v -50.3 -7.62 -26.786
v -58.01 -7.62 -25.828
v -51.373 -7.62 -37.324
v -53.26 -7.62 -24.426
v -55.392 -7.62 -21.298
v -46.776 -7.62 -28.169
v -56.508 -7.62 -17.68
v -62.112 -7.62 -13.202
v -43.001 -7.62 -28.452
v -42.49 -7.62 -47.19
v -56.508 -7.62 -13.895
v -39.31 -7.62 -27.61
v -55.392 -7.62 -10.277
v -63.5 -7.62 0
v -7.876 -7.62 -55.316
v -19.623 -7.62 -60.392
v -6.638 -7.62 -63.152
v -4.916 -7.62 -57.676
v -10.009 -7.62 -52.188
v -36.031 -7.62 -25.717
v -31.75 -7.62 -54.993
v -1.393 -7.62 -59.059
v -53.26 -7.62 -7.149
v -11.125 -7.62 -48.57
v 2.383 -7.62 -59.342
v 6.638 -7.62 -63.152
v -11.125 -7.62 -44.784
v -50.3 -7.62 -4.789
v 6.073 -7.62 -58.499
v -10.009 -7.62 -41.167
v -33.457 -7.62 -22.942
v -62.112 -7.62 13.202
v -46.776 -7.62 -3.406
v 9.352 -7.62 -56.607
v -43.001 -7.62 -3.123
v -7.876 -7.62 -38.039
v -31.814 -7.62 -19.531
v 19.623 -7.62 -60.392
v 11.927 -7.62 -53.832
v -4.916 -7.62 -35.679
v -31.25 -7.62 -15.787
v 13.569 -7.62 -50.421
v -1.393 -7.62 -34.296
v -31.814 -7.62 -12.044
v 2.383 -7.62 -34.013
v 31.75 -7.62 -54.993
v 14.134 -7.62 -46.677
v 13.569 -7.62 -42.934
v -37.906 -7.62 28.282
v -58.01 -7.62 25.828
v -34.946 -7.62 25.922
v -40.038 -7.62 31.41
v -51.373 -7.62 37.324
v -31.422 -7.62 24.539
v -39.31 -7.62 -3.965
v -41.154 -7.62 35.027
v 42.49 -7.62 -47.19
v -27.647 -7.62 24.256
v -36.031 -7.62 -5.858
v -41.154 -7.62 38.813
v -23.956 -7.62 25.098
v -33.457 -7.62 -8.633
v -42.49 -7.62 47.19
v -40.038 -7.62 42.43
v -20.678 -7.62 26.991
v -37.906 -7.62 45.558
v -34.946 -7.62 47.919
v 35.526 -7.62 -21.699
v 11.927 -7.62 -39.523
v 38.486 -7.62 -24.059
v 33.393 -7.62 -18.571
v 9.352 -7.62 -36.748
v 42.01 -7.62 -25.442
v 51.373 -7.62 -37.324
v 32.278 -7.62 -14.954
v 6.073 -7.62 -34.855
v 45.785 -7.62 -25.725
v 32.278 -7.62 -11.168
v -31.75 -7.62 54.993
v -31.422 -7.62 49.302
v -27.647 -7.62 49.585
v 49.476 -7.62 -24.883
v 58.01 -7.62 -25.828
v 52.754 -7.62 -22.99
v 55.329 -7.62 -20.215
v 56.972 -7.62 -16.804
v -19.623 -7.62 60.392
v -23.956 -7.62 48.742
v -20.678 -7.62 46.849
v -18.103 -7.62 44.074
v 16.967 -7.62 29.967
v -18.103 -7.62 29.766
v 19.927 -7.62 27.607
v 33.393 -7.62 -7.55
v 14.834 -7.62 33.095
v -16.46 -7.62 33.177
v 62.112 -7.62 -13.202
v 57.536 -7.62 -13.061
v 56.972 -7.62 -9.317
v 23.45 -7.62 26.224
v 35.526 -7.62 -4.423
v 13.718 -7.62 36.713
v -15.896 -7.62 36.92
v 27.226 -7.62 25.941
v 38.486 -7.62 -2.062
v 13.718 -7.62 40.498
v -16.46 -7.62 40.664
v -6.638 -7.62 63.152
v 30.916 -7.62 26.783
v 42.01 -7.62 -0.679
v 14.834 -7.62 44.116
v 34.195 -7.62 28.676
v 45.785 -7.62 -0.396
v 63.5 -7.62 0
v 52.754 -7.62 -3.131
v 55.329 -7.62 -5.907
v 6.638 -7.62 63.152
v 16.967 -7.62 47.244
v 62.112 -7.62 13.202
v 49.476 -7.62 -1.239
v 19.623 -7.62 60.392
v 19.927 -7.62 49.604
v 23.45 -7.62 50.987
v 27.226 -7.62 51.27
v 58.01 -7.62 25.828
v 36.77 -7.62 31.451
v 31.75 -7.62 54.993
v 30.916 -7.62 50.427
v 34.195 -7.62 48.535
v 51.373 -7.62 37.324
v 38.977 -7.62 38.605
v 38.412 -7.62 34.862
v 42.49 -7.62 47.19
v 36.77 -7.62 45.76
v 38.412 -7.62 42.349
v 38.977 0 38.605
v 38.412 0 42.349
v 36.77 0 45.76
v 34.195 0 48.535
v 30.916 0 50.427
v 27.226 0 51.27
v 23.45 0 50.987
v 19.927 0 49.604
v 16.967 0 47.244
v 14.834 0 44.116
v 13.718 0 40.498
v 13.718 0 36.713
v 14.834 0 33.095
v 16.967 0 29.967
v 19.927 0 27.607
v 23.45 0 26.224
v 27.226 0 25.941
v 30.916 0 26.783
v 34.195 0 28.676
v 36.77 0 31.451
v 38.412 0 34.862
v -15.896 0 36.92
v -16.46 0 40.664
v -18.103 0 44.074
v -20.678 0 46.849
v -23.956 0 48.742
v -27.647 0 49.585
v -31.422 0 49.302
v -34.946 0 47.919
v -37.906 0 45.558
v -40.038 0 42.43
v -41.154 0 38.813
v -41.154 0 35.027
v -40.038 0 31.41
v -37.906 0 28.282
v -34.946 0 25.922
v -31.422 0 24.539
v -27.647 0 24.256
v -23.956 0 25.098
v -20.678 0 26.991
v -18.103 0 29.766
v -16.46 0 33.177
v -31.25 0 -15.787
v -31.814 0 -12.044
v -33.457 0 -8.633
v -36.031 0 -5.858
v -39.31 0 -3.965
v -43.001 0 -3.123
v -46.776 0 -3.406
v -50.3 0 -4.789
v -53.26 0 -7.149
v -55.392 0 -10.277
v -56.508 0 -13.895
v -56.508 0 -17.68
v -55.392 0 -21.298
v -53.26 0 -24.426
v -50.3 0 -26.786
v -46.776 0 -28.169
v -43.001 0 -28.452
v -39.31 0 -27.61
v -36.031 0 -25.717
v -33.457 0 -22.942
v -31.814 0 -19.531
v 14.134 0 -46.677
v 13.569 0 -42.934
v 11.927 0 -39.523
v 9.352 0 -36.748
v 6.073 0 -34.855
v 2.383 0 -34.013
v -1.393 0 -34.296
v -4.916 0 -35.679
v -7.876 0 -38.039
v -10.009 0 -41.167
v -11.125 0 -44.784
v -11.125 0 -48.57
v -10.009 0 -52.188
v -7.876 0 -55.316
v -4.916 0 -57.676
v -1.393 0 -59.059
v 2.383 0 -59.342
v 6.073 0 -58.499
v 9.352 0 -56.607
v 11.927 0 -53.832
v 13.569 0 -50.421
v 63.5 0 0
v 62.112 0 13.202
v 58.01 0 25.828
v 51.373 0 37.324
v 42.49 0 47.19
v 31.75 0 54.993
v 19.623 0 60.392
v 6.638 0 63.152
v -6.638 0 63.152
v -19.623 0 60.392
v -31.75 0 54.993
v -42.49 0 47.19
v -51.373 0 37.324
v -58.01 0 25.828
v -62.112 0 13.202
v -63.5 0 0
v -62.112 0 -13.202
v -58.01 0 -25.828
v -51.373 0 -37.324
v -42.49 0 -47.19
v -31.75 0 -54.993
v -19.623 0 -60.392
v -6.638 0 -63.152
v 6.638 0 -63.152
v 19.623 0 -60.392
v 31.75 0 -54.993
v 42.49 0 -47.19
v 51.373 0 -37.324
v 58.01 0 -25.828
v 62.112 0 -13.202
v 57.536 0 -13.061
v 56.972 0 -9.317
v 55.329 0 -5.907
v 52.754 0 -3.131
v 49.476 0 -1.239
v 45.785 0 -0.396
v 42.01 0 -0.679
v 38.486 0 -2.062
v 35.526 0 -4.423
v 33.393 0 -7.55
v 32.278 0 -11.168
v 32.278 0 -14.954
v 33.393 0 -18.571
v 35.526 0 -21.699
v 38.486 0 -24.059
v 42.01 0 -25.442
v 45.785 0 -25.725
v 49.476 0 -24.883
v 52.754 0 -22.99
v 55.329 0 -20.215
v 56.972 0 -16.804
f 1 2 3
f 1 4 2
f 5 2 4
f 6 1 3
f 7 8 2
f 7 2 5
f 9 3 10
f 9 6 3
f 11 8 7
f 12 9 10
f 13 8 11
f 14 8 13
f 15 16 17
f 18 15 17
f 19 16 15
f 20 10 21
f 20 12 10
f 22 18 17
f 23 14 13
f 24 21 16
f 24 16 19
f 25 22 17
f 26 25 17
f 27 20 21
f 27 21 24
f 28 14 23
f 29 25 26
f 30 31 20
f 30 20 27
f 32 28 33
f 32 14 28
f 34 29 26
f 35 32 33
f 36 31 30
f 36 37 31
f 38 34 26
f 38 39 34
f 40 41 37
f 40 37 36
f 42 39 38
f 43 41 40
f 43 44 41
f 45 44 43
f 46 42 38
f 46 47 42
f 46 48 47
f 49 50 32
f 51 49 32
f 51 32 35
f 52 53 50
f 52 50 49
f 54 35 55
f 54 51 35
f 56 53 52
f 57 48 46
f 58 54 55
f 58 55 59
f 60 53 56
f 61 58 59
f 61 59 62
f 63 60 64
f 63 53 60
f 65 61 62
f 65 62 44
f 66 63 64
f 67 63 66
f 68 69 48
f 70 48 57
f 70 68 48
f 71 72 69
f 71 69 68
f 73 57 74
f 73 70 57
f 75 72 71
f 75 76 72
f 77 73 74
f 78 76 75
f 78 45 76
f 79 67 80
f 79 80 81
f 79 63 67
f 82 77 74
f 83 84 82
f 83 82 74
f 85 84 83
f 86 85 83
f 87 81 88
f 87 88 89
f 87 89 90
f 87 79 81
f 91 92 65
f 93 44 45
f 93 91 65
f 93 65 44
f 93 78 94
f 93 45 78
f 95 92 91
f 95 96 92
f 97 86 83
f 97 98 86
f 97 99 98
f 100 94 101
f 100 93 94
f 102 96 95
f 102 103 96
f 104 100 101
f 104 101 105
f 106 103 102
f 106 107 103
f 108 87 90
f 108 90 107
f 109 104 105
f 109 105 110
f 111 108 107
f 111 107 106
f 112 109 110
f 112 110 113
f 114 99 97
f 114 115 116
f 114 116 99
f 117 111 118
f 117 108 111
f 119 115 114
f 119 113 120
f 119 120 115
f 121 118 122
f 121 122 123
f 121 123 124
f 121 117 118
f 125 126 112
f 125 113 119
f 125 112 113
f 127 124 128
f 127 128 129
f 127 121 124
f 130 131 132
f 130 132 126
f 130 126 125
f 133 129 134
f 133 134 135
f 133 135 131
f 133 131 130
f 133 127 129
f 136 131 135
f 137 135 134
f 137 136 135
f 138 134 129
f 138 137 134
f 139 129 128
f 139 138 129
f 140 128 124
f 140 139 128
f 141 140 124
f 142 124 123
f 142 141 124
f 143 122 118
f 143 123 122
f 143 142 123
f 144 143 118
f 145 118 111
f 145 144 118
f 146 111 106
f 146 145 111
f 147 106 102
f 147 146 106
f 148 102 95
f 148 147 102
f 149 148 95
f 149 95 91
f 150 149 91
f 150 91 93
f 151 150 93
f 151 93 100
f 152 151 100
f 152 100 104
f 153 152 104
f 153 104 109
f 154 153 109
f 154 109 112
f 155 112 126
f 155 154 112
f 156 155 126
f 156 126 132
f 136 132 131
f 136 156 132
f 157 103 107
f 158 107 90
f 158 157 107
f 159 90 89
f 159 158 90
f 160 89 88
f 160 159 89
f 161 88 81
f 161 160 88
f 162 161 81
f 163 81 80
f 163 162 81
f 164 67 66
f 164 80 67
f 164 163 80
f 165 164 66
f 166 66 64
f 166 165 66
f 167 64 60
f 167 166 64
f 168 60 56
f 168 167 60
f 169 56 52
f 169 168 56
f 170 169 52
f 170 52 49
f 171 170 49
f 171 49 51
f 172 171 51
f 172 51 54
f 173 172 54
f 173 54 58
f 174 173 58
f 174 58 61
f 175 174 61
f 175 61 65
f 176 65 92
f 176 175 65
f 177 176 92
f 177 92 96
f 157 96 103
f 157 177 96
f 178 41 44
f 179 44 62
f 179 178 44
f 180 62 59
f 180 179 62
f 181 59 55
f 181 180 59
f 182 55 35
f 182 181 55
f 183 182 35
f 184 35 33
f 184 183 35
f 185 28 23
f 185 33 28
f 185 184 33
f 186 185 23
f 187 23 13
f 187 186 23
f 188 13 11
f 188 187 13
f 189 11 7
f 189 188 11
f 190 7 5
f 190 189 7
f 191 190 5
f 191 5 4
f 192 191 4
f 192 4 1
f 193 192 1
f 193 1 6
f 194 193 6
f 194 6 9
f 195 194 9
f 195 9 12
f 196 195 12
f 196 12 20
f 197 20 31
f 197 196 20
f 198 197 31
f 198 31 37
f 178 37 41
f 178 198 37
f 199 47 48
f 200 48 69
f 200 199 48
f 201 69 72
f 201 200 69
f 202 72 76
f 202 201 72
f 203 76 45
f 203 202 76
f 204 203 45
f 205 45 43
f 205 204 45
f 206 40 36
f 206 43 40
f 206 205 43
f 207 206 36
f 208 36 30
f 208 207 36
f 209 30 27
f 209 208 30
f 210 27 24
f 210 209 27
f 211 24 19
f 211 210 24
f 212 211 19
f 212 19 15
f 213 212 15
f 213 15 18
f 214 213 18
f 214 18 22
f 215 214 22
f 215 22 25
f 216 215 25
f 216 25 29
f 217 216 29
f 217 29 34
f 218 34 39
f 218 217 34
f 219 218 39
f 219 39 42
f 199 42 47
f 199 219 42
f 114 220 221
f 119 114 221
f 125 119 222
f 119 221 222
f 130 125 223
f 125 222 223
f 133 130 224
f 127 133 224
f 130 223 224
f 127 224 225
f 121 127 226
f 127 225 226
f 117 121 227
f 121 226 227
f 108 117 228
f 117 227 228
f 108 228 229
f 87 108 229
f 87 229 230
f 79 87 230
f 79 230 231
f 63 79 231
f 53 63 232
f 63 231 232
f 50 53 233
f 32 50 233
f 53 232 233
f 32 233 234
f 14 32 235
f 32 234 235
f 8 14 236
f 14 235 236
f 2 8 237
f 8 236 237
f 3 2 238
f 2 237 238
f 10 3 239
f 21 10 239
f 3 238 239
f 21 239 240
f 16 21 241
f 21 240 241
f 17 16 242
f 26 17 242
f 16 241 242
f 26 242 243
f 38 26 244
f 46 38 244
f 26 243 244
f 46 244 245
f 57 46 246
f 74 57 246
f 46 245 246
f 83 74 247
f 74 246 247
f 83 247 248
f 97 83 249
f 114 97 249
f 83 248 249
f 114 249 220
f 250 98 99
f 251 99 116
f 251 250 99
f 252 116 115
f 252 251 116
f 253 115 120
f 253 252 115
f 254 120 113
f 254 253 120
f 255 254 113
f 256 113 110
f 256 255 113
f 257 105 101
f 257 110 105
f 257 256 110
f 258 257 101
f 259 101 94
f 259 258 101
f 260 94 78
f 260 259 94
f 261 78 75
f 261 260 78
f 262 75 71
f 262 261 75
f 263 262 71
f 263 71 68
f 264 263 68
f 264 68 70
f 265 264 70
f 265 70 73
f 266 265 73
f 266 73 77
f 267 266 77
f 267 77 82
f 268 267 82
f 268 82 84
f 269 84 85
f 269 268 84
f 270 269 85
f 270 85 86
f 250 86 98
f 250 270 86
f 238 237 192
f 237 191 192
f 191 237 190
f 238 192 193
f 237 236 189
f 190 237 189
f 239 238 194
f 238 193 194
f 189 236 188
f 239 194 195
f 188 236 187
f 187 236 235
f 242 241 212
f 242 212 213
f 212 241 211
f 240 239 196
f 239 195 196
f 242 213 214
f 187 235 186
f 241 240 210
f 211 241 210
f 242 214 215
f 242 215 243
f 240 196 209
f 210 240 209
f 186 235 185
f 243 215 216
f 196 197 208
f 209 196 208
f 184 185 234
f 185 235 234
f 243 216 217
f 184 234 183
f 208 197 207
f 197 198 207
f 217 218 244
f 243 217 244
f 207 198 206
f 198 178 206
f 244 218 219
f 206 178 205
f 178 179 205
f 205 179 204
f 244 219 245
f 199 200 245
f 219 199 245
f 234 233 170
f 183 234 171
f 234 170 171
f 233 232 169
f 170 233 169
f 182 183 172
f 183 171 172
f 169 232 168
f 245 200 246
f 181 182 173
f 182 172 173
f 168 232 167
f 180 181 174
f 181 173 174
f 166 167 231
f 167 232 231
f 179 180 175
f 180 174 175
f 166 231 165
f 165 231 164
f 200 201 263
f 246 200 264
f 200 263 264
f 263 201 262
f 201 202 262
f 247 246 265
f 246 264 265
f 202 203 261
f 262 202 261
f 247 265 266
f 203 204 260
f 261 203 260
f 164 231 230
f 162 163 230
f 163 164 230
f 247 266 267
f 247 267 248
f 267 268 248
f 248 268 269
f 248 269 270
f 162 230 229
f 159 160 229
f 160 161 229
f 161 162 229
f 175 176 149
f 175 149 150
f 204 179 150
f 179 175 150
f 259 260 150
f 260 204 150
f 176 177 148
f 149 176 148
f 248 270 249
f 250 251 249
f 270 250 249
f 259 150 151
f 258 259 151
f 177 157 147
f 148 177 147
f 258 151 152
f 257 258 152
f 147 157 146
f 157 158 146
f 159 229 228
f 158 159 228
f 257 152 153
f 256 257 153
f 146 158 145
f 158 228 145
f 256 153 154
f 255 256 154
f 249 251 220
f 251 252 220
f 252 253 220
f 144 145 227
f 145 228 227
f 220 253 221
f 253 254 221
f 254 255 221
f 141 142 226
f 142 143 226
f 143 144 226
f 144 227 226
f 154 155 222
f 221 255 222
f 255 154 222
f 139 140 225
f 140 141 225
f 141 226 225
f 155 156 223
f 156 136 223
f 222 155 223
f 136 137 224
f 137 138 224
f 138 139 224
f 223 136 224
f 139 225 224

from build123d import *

# Parameters (mm, degrees)
F0_R     = 63.5
F1_DEPTH = 7.62
F2_R     = 12.7
F3_DEPTH = 7.621


with BuildPart() as f1:
    # F0 (on Front) → F1 (new body)
    with BuildSketch(Plane.XZ):
        Circle(F0_R)
    extrude(amount=F1_DEPTH)

    # F2 (on Front) → F3 (cut, through all)
    with BuildSketch(Plane.XZ):
        with Locations((-28.595986, 36.92016)):
            Circle(F2_R)
        with Locations((-43.949804, -15.787442)):
            Circle(F2_R)
        with Locations((1.433513, -46.677336)):
            Circle(F2_R)
        with Locations((44.835764, -13.060738)):
            Circle(F2_R)
        with Locations((26.276513, 38.605356)):
            Circle(F2_R)
    extrude(amount=F3_DEPTH, mode=Mode.SUBTRACT)


solid = f1.part
